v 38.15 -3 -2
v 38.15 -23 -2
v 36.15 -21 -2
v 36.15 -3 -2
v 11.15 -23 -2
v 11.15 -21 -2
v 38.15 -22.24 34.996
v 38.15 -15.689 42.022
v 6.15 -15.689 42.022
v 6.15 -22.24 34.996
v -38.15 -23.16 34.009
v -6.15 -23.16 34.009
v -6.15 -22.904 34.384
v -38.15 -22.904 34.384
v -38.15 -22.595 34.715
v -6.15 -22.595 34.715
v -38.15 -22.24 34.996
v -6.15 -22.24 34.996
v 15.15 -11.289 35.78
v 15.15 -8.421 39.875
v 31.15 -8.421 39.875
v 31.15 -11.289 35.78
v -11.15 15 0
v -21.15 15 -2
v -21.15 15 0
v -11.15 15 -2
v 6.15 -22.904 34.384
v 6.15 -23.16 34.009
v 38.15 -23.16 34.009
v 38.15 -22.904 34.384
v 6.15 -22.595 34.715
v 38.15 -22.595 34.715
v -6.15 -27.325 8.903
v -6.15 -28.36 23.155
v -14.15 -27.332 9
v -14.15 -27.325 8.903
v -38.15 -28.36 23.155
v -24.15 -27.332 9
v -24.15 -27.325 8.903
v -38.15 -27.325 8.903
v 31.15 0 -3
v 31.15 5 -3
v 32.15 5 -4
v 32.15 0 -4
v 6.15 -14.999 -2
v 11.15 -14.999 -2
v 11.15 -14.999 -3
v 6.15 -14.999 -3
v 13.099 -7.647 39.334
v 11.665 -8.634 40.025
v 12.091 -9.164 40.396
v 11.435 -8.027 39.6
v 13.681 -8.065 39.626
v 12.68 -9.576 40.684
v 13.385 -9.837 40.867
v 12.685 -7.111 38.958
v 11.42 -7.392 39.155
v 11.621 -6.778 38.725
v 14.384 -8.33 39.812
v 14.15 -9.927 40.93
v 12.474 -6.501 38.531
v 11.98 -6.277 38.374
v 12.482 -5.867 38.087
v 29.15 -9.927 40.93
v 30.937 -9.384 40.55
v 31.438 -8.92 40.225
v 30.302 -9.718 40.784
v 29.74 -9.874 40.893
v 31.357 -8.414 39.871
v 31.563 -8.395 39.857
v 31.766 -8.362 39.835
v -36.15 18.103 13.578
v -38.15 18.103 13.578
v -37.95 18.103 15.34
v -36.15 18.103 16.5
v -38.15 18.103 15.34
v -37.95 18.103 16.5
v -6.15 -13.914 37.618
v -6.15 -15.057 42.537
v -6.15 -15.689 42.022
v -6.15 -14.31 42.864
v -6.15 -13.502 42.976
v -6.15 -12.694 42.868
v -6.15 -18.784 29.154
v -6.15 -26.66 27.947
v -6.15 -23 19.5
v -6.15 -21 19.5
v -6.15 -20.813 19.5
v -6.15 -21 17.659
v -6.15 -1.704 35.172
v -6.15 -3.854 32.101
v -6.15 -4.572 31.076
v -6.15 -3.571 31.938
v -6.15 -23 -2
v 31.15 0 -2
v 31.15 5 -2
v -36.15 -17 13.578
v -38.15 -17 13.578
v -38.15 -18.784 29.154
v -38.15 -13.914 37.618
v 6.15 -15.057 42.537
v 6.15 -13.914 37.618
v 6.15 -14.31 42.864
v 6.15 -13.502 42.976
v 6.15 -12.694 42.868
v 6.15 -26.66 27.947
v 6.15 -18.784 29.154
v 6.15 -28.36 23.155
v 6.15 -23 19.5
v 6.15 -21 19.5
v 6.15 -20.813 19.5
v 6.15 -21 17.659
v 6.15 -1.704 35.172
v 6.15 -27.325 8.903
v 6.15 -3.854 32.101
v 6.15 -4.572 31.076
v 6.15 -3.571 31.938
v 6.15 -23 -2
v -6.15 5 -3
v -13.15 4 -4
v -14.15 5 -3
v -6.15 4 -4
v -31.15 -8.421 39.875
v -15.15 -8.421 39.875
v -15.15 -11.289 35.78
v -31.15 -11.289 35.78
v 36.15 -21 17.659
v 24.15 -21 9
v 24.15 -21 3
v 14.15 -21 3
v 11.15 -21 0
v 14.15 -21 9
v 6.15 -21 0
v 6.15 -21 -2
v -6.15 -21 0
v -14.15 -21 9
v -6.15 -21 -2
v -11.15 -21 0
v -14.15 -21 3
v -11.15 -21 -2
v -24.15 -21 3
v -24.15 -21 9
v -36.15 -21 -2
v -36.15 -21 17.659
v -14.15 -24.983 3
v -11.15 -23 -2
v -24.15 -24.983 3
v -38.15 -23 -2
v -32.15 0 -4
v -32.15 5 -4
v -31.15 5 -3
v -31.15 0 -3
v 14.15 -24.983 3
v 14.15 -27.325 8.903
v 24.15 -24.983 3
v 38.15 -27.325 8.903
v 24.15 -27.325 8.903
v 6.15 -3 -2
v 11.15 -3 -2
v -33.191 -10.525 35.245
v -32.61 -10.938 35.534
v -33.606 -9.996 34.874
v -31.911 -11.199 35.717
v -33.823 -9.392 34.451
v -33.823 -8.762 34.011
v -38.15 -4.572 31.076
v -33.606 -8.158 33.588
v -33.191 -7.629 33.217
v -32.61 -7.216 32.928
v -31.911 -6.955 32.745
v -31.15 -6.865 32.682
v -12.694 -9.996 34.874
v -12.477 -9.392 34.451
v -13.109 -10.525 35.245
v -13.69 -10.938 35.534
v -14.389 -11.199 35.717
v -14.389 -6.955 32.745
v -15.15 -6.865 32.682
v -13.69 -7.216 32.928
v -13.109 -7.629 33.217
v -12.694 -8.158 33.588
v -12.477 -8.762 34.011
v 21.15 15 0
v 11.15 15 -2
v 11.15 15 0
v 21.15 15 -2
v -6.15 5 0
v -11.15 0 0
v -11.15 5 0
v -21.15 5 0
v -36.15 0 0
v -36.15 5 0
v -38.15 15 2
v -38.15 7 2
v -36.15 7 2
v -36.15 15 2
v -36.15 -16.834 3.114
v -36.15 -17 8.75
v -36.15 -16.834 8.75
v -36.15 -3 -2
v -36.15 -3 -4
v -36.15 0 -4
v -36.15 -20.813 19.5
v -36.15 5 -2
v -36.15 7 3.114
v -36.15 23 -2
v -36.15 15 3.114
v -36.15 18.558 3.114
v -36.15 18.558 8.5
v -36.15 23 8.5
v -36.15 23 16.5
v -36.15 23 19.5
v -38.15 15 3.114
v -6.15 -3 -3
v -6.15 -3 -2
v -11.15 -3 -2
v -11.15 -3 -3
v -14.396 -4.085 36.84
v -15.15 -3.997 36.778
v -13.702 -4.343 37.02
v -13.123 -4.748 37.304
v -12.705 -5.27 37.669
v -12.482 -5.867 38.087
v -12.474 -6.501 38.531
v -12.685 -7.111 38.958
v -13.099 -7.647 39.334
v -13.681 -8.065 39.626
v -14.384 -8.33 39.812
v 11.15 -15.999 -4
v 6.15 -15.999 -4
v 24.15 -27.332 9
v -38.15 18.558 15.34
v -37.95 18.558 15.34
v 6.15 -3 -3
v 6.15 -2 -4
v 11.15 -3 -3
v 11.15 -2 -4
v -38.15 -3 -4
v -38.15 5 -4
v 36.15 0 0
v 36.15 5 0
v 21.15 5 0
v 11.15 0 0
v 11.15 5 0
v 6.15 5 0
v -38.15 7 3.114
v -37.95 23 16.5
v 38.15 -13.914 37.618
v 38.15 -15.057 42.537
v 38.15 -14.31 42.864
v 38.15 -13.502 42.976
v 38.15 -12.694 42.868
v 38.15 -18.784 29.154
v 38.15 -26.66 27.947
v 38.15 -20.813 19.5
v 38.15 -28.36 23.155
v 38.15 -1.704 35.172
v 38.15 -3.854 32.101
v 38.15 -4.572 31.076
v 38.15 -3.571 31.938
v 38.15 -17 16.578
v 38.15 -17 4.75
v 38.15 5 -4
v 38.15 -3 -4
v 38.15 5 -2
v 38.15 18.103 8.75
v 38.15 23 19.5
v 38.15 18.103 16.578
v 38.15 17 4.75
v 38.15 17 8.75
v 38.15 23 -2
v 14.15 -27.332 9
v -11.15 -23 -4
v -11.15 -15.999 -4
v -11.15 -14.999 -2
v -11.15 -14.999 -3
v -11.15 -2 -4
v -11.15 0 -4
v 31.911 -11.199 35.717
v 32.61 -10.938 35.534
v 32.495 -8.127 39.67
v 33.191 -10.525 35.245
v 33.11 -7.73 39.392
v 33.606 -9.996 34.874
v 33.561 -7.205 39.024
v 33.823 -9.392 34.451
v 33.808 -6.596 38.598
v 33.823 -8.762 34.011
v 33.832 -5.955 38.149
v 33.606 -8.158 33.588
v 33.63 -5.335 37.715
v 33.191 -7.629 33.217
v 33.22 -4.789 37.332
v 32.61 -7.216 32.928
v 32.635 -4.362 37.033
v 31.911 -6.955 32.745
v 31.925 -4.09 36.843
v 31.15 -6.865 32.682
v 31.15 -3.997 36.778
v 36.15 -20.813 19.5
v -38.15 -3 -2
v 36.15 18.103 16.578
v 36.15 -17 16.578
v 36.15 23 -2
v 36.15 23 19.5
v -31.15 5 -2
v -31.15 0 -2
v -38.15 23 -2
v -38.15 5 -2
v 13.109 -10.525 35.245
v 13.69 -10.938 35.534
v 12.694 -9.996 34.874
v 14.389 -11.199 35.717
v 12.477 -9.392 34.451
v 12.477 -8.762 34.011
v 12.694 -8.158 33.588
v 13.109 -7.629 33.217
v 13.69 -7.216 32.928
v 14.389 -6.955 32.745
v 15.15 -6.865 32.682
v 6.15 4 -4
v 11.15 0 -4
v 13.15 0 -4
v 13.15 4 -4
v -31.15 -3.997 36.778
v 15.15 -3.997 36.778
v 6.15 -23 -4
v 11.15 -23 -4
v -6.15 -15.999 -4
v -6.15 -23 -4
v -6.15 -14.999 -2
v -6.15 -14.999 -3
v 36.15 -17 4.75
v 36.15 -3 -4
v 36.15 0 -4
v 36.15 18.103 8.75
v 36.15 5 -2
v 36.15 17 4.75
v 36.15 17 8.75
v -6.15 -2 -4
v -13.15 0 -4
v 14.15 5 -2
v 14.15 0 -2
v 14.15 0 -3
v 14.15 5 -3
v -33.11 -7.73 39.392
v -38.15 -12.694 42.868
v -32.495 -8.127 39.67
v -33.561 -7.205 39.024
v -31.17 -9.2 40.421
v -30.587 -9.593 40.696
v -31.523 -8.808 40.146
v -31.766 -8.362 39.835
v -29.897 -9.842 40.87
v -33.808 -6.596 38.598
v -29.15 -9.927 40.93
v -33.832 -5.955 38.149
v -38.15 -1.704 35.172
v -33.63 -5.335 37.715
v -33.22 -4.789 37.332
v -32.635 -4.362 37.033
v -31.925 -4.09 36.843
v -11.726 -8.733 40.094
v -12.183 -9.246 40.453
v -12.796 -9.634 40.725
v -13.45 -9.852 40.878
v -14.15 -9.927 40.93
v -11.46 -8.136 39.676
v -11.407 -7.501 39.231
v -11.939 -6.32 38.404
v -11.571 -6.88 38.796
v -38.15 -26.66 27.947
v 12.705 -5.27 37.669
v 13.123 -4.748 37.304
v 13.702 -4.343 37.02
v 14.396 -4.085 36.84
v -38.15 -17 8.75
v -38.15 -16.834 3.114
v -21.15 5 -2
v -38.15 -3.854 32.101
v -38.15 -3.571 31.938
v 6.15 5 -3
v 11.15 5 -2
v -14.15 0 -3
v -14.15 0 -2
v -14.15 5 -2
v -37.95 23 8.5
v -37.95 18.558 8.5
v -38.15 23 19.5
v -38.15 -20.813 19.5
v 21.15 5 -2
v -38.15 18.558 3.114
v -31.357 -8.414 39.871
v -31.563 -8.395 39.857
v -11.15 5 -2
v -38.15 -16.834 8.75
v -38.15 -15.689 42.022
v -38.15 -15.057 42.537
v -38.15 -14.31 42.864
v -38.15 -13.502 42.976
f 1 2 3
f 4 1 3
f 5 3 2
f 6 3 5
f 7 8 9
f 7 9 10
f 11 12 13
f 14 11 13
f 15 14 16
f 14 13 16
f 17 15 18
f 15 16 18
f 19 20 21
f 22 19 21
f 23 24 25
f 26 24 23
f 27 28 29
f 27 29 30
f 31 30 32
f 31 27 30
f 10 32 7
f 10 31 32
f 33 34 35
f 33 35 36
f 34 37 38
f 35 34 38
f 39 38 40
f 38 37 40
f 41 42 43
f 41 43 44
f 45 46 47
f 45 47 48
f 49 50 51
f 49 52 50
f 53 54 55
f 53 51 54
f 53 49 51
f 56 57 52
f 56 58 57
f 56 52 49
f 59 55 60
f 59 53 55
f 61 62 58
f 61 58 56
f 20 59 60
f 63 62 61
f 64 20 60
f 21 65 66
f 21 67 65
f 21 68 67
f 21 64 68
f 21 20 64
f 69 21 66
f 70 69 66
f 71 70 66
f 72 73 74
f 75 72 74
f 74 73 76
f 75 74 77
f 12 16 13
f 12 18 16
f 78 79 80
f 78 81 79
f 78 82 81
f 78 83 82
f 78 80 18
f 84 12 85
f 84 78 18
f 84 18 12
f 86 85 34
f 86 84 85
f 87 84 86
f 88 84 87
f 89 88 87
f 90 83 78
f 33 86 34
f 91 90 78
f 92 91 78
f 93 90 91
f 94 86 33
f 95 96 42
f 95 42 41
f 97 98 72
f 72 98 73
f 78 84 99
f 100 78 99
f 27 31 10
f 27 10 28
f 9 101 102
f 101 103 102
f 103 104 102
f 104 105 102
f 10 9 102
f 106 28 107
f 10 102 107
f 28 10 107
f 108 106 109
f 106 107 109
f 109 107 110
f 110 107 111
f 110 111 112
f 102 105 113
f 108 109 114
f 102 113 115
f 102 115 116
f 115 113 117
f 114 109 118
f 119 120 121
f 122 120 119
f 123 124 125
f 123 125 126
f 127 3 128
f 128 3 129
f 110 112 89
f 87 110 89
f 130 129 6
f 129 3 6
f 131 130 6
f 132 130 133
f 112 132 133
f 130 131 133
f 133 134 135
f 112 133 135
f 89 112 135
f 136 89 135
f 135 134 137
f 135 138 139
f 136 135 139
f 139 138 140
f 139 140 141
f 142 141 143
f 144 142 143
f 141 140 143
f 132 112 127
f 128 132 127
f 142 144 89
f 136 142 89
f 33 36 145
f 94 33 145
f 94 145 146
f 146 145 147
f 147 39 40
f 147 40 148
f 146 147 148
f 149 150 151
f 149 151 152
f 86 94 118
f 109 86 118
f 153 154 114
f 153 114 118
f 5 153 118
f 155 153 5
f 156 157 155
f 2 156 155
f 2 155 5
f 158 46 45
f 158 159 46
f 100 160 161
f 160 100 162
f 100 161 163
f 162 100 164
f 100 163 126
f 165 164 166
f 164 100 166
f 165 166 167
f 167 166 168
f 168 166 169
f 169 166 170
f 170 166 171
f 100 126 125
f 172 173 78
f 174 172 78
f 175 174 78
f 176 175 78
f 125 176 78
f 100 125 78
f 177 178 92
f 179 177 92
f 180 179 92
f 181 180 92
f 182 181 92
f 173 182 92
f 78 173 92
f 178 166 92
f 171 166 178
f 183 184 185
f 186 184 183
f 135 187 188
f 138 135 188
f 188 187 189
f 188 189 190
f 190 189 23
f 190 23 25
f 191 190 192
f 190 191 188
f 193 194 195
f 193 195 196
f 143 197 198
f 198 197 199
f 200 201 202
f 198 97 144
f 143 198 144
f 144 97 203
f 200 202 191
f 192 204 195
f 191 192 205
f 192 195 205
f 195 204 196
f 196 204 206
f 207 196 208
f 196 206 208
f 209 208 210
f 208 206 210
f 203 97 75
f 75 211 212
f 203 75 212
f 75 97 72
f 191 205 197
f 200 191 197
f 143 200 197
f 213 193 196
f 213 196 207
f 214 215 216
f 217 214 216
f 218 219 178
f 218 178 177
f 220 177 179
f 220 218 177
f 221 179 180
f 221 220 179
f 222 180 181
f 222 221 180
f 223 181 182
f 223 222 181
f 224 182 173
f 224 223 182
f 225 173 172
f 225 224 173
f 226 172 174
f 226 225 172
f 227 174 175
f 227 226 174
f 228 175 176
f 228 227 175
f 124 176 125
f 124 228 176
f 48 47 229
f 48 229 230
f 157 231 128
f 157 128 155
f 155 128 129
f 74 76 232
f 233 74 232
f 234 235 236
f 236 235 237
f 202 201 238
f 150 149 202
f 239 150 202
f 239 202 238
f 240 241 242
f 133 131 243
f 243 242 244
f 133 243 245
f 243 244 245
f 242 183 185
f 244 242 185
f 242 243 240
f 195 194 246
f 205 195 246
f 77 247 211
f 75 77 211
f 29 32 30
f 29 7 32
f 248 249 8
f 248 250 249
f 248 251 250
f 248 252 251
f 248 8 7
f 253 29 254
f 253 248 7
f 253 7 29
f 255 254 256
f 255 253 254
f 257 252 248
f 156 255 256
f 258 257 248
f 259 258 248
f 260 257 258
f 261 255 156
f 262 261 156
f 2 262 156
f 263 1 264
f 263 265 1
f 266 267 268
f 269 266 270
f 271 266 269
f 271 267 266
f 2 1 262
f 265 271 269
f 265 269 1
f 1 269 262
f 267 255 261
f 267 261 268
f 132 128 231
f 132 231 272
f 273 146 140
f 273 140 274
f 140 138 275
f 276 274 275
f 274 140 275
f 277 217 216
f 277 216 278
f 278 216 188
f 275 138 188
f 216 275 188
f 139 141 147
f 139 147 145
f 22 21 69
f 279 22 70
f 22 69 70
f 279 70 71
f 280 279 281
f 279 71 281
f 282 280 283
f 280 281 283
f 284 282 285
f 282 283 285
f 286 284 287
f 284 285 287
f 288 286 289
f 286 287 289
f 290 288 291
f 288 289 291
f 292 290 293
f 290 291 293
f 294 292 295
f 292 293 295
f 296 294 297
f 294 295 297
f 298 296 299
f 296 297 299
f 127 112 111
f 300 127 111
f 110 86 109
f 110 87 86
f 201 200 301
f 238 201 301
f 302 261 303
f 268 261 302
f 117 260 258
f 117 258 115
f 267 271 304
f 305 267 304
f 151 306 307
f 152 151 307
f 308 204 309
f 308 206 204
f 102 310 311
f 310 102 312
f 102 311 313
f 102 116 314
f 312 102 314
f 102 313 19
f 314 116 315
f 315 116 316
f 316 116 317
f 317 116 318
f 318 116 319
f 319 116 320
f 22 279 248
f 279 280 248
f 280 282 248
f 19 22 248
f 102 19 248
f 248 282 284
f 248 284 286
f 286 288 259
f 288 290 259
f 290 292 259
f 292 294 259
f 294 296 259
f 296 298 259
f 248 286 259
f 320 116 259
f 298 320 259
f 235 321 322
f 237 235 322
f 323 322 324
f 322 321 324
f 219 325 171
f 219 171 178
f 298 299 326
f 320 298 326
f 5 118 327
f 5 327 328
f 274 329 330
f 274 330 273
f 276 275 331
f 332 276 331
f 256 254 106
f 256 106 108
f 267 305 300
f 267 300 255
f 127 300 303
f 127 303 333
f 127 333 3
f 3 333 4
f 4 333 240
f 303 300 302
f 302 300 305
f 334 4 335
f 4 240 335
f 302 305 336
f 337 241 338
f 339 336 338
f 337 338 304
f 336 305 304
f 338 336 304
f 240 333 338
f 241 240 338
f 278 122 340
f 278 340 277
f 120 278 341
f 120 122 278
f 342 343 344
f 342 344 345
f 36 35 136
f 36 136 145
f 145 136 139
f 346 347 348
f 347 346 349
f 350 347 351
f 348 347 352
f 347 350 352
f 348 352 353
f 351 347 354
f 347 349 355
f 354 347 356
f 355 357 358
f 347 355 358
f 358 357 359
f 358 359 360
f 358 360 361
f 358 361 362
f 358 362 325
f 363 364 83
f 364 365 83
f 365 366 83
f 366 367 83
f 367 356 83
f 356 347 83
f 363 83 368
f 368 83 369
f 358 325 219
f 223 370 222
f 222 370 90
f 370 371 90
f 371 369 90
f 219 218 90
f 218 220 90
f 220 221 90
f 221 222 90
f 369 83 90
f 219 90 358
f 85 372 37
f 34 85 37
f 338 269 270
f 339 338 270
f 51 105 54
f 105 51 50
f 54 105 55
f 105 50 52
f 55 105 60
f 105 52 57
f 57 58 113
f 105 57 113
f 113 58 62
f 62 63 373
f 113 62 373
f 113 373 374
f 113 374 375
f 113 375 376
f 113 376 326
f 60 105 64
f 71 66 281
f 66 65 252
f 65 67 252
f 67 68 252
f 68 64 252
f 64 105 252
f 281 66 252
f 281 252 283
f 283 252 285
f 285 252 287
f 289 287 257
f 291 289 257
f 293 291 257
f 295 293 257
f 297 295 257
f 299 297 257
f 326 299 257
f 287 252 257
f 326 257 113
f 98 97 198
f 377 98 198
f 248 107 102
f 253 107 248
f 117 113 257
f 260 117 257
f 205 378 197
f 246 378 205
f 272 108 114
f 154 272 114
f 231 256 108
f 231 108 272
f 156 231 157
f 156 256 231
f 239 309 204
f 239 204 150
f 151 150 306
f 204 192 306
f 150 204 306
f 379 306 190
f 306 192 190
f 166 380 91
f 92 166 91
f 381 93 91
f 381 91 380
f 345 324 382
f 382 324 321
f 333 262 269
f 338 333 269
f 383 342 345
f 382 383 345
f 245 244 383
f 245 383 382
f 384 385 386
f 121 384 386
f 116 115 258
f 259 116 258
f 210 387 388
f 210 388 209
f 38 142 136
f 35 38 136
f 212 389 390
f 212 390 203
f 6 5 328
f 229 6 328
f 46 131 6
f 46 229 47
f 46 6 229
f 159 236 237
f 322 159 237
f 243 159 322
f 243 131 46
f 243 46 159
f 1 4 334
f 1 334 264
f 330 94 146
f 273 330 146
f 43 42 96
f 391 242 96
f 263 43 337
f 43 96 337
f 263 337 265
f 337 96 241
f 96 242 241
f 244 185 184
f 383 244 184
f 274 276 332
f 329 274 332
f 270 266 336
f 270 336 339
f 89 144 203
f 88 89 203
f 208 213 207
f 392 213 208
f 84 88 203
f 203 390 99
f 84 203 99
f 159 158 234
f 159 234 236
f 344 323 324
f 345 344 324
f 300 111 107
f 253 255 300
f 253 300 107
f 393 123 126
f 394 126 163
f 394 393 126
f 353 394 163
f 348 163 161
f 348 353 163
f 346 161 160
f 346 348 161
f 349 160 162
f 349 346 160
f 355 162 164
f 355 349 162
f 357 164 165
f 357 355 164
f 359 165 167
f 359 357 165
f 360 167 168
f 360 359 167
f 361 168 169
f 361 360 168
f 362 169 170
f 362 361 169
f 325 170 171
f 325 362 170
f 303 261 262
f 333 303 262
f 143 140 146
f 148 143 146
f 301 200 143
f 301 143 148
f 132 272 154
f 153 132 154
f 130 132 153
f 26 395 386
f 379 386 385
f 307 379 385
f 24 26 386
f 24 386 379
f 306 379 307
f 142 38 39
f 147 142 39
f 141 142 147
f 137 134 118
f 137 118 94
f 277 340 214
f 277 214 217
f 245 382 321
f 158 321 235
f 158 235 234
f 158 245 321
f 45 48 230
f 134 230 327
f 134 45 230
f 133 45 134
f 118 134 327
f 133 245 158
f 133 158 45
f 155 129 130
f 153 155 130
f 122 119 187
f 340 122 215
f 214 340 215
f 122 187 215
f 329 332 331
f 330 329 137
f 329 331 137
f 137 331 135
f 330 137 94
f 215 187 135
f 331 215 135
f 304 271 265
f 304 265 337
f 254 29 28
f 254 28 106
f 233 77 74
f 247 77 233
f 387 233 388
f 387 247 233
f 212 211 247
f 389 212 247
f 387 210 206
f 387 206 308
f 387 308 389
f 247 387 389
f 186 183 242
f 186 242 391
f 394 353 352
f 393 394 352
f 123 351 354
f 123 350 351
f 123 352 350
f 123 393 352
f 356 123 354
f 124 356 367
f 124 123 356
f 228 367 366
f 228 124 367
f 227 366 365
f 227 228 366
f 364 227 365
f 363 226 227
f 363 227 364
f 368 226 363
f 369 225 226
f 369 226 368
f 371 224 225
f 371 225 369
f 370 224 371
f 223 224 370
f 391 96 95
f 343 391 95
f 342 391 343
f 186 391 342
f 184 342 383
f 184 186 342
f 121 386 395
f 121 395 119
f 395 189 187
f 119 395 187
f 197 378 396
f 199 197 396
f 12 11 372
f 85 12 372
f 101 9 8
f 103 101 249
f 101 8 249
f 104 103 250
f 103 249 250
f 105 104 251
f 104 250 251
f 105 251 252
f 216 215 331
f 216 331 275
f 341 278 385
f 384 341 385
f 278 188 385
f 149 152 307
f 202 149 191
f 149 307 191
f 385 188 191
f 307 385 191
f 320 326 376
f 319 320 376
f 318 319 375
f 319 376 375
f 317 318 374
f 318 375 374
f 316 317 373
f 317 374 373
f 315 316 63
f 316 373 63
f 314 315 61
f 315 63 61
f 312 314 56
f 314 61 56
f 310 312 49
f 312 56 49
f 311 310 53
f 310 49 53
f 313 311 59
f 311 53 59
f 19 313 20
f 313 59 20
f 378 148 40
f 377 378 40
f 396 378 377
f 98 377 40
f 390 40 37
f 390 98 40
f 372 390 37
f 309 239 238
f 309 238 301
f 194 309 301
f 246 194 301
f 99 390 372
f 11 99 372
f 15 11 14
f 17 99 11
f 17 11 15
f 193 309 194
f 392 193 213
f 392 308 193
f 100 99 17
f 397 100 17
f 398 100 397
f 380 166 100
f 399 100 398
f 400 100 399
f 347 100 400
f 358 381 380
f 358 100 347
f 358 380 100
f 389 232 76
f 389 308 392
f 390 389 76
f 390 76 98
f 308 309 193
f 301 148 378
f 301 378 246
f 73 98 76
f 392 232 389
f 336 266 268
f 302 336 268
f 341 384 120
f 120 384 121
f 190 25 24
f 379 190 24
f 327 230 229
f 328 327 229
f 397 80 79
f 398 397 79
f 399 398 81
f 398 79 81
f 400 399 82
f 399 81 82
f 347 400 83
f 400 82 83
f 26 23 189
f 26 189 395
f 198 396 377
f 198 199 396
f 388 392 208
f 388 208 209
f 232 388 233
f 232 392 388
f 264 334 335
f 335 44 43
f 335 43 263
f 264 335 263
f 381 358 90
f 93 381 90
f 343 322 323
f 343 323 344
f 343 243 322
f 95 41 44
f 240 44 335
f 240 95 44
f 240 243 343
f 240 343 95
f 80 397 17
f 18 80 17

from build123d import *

# Parameters (mm, degrees)
EXTRUDE_2_DEPTH      = 10
SKETCH_6_W           = 2
SKETCH_6_H           = 18
EXTRUDE_3_DEPTH      = 2
EXTRUDE_4_DEPTH      = 9.5
SKETCH_8_W           = 7
SKETCH_8_H           = 28
CUT_EXTRUDE_3_DEPTH  = 25.5
SKETCH_9_W           = 7.5
SKETCH_9_H           = 8
CUT_EXTRUDE_4_DEPTH  = 25.5
SKETCH_10_W          = 1.5
SKETCH_10_H          = 3
CUT_EXTRUDE_5_DEPTH  = 32
EXTRUDE_5_DEPTH      = 32
FILLET_1_R           = 3
FILLET_2_R           = 3
SKETCH_15_W          = 10
SKETCH_15_H          = 2
EXTRUDE_6_DEPTH      = 10
CUT_EXTRUDE_7_DEPTH  = 10
SKETCH_17_W          = 5
SKETCH_17_H          = 6
CUT_EXTRUDE_8_DEPTH  = 10
SKETCH_18_W          = 1.50410549
SKETCH_18_H          = 3
CUT_EXTRUDE_9_DEPTH  = 32
SKETCH_19_W          = 5
SKETCH_19_H          = 6
CUT_EXTRUDE_10_DEPTH = 10
CUT_EXTRUDE_11_DEPTH = 10
SKETCH_22_W          = 1.8
SKETCH_22_H          = 8
CUT_EXTRUDE_12_DEPTH = 34
CUT_EXTRUDE_13_DEPTH = 34
EXTRUDE_7_DEPTH      = 2
CHAMFER_1_SIZE       = 1
EXTRUDE_START        = 10
SKETCH_25_W          = 32
SKETCH_25_H          = 15
EXTRUDE_8_DEPTH      = 10
EXTRUDE_9_DEPTH      = 32
CUT_EXTRUDE_15_DEPTH = 10
FILLET_3_R           = 3
SKETCH_28_W          = 12.226221142
SKETCH_28_H          = 35.391692779
CUT_EXTRUDE_16_DEPTH = 10
CUT_EXTRUDE_17_DEPTH = 95
CUT_EXTRUDE_18_DEPTH = 95
SKETCH_31_W          = 3
SKETCH_31_H          = 34
EXTRUDE_10_DEPTH     = 2
SKETCH_32_W          = 3
SKETCH_32_H          = 35.103131655
EXTRUDE_11_DEPTH     = 2
SKETCH_33_W          = 32
SKETCH_33_H          = 13.416826231
EXTRUDE_12_DEPTH     = 5
CUT_EXTRUDE_19_DEPTH = 5


with BuildPart() as part:
    # 草图5 → 凸台-拉伸2 (new body)
    with BuildSketch(Plane.XY):
        Polygon((-38.15, -23), (-38.15, 23), (-36.15, 23), (-36.15, -21), (36.15, -21), (36.15, 23), (38.15, 23), (38.15, -23), align=None)
    extrude(amount=EXTRUDE_2_DEPTH)

    # 草图6 → 凸台-拉伸3 (add)
    with BuildSketch(Plane(origin=(0, 0, 0), x_dir=(-1, 0, 0), z_dir=(0, 0, -1))):
        Polygon((-6.15, 5), (-36.15, 5), (-36.15, 0), (-11.15, 0), (-11.15, -21), (-6.15, -21), align=None)
        Polygon((-36.15, 0), (-36.15, 5), (-36.15, 23), (-38.15, 23), (-38.15, 5), (-38.15, 0), (-38.15, -23), (-11.15, -23), (-6.15, -23), (6.15, -23), (11.15, -23), (38.15, -23), (38.15, 0), (38.15, 5), (36.15, 5), (36.15, 0), (36.15, -21), (11.15, -21), (6.15, -21), (-6.15, -21), (-11.15, -21), (-36.15, -21), align=None)
        Polygon((6.15, 0), (6.15, -21), (11.15, -21), (11.15, 0), (36.15, 0), (36.15, 5), (6.15, 5), align=None)
        with Locations((37.15, 14)):
            Rectangle(SKETCH_6_W, SKETCH_6_H)
    extrude(amount=EXTRUDE_3_DEPTH)

    # 草图7 → 凸台-拉伸4 (add)
    with BuildSketch(Plane.XY.offset(10)):
        Polygon((36.15, 23), (36.15, -21), (-36.15, -21), (-36.15, 23), (-38.15, 23), (-38.15, -23), (38.15, -23), (38.15, 23), align=None)
    extrude(amount=EXTRUDE_4_DEPTH)

    # 草图8 → 切除-拉伸3 (cut)
    with BuildSketch(Plane(origin=(38.15, 0, 0), x_dir=(0, 0, -1), z_dir=(1, 0, 0))):
        with Locations((-5.25, 0)):
            Rectangle(SKETCH_8_W, SKETCH_8_H)
    extrude(amount=-CUT_EXTRUDE_3_DEPTH, mode=Mode.SUBTRACT)

    # 草图9 → 切除-拉伸4 (cut)
    with BuildSketch(Plane.ZY.offset(38.15)):
        with Locations((5.75, 11)):
            Rectangle(SKETCH_9_W, SKETCH_9_H)
    extrude(amount=-CUT_EXTRUDE_4_DEPTH, mode=Mode.SUBTRACT)

    # 草图10 → 切除-拉伸5 (cut)
    with BuildSketch(Plane(origin=(0, 23, 0), x_dir=(1, 0, 0), z_dir=(0, 1, 0))):
        with Locations((-36.9, -12)):
            Rectangle(SKETCH_10_W, SKETCH_10_H)
    extrude(amount=-CUT_EXTRUDE_5_DEPTH, mode=Mode.SUBTRACT)

    # 草图11 → 凸台-拉伸5 (add)
    with BuildSketch(Plane(origin=(38.15, 0, 0), x_dir=(0, 0, -1), z_dir=(1, 0, 0))):
        Polygon((-27.947222626, -26.659598219), (-23.155372135, -28.359869707), (-8.903497586, -27.324579693), (2, -23), (-19.5, -20.812742031), (-29.153549837, -18.784030413), (-23.27364124, -8.564706774), (-27.607476664, -6.071140951), (-36.607476664, -21.659598219), align=None)
    extrude_5 = extrude(amount=-EXTRUDE_5_DEPTH)

    # 镜向1: 凸台-拉伸5 across plane
    add(extrude_5.mirror(Plane(origin=(0, 0, 0), x_dir=(0, 0, 1), z_dir=(1, 0, 0))))

    # 圆角1
    fillet_1_edges = [part.edges().sort_by_distance(p)[0] for p in [
        (-22.15, -21.659598219, 36.607476664),
    ]]
    fillet(fillet_1_edges, radius=FILLET_1_R)

    # 圆角2
    fillet_2_edges = [part.edges().sort_by_distance(p)[0] for p in [
        (22.15, -21.659598219, 36.607476664),
    ]]
    fillet(fillet_2_edges, radius=FILLET_2_R)

    # 草图15 → 凸台-拉伸6 (add)
    with BuildSketch(Plane(origin=(0, 5, 0), x_dir=(1, 0, 0), z_dir=(0, 1, 0))):
        with Locations((-16.15, 1)):
            Rectangle(SKETCH_15_W, SKETCH_15_H)
        with Locations((16.15, 1)):
            Rectangle(SKETCH_15_W, SKETCH_15_H)
    extrude(amount=EXTRUDE_6_DEPTH)

    # 草图16 → 切除-拉伸7 (cut)
    with BuildSketch(Plane(origin=(38.15, 0, 0), x_dir=(0, 0, -1), z_dir=(1, 0, 0))):
        Polygon((-9.75, 5), (-8.75, 5), (-8.75, 14), (-1.75, 14), (-1.75, 17), (-9.75, 17), align=None)
    extrude(amount=-CUT_EXTRUDE_7_DEPTH, mode=Mode.SUBTRACT)

    # 草图17 → 切除-拉伸8 (cut)
    with BuildSketch(Plane(origin=(0, -21, 0), x_dir=(1, 0, 0), z_dir=(0, 1, 0))):
        with Locations((-21.65, -6)):
            Rectangle(SKETCH_17_W, SKETCH_17_H)
    cut_extrude_8 = extrude(amount=-CUT_EXTRUDE_8_DEPTH, mode=Mode.SUBTRACT)

    # 镜向3: 切除-拉伸8 across plane
    add(cut_extrude_8.mirror(Plane(origin=(0, 0, 0), x_dir=(0, 0, 1), z_dir=(1, 0, 0))), mode=Mode.SUBTRACT)

    # 草图18 → 切除-拉伸9 (cut)
    with BuildSketch(Plane(origin=(0, 23, 0), x_dir=(1, 0, 0), z_dir=(0, 1, 0))):
        with Locations((-36.902052745, -15)):
            Rectangle(SKETCH_18_W, SKETCH_18_H)
    extrude(amount=-CUT_EXTRUDE_9_DEPTH, mode=Mode.SUBTRACT)

    # 草图19 → 切除-拉伸10 (cut)
    with BuildSketch(Plane(origin=(0, -21, 0), x_dir=(1, 0, 0), z_dir=(0, 1, 0))):
        with Locations((-16.65, -6)):
            Rectangle(SKETCH_19_W, SKETCH_19_H)
    cut_extrude_10 = extrude(amount=-CUT_EXTRUDE_10_DEPTH, mode=Mode.SUBTRACT)

    # 镜向4: 切除-拉伸10 across plane
    add(cut_extrude_10.mirror(Plane(origin=(0, 0, 0), x_dir=(0, 0, 1), z_dir=(1, 0, 0))), mode=Mode.SUBTRACT)

    # 草图21 → 切除-拉伸11 (cut)
    with BuildSketch(Plane(origin=(0, 10.436602825, 18.076726351), x_dir=(1, 0, 0), z_dir=(0, 0.5000000000000001, 0.8660254037844386))):
        with BuildLine():
            Line((-29.15, -23.561500625), (-14.15, -23.561500625))
            ThreePointArc((-14.15, -23.561500625), (-11.4, -26.311500625), (-14.15, -29.061500625))
            Line((-14.15, -29.061500625), (-29.15, -29.061500625))
            ThreePointArc((-29.15, -29.061500625), (-31.9, -26.311500625), (-29.15, -23.561500625))
        make_face()
        with BuildLine():
            Line((14.15, -23.561500625), (29.15, -23.561500625))
            ThreePointArc((29.15, -23.561500625), (31.9, -26.311500625), (29.15, -29.061500625))
            Line((29.15, -29.061500625), (14.15, -29.061500625))
            ThreePointArc((14.15, -29.061500625), (11.4, -26.311500625), (14.15, -23.561500625))
        make_face()
    extrude(amount=-CUT_EXTRUDE_11_DEPTH, mode=Mode.SUBTRACT)

    # 草图22 → 切除-拉伸12 (cut)
    with BuildSketch(Plane(origin=(0, 23, 0), x_dir=(1, 0, 0), z_dir=(0, 1, 0))):
        with Locations((-37.05, -12.5)):
            Rectangle(SKETCH_22_W, SKETCH_22_H)
    extrude(amount=-CUT_EXTRUDE_12_DEPTH, mode=Mode.SUBTRACT)

    # 草图23 → 切除-拉伸13 (cut)
    with BuildSketch(Plane(origin=(38.15, 0, 0), x_dir=(0, 0, -1), z_dir=(1, 0, 0))):
        Polygon((-8.75, -14), (-8.75, 1), (-14.75, 1), (-14.75, -14), (-14.75, -17), (-1.75, -17), (-1.75, -14), align=None)
    extrude(amount=-CUT_EXTRUDE_13_DEPTH, mode=Mode.SUBTRACT)

    # 草图24 → 凸台-拉伸7 (add)
    with BuildSketch(Plane(origin=(0, 0, -2), x_dir=(-1, 0, 0), z_dir=(0, 0, -1))):
        Polygon((6.15, 5), (6.15, -3), (11.15, -3), (11.15, 0), (14.15, 0), (14.15, 5), (11.15, 5), align=None)
        Polygon((6.15, -21), (6.15, -23), (11.15, -23), (11.15, -21), (11.15, -14.999314237), (6.15, -14.999314237), align=None)
        Polygon((36.15, -3), (38.15, -3), (38.15, 5), (36.15, 5), (31.15, 5), (31.15, 0), (36.15, 0), align=None)
    extrude_7 = extrude(amount=EXTRUDE_7_DEPTH)

    # 镜向5: 凸台-拉伸7 across plane
    add(extrude_7.mirror(Plane(origin=(0, 0, 0), x_dir=(0, 0, 1), z_dir=(1, 0, 0))))

    # 倒角1
    chamfer_1_edges = [part.edges().sort_by_distance(p)[0] for p in [
        (-8.65, -14.999314237, -4),
        (8.65, -14.999314237, -4),
        (-31.15, 2.5, -4),
        (31.15, 2.5, -4),
        (-14.15, 2.5, -4),
        (-10.15, 5, -4),
        (-8.65, -3, -4),
        (8.65, -3, -4),
        (10.15, 5, -4),
        (14.15, 2.5, -4),
    ]]
    chamfer(chamfer_1_edges, length=CHAMFER_1_SIZE)

    # 草图25 → 凸台-拉伸8 (add)
    # profile 1 of 2: a face of its own
    with BuildSketch(Plane(origin=(0, 10.436602825, 18.076726351), x_dir=(1, 0, 0), z_dir=(0, 0.5000000000000001, 0.8660254037844386)).offset(EXTRUDE_START)):
        with Locations((22.15, -26.561500625)):
            Rectangle(SKETCH_25_W, SKETCH_25_H)
        with BuildLine():
            Line((14.15, -23.561500625), (29.15, -23.561500625))
            ThreePointArc((29.15, -23.561500625), (31.9, -26.311500625), (29.15, -29.061500625))
            Line((29.15, -29.061500625), (14.15, -29.061500625))
            ThreePointArc((14.15, -29.061500625), (11.4, -26.311500625), (14.15, -23.561500625))
        make_face(mode=Mode.SUBTRACT)
    # profile 2 of 2: a face of its own
    with BuildSketch(Plane(origin=(0, 10.436602825, 18.076726351), x_dir=(1, 0, 0), z_dir=(0, 0.5000000000000001, 0.8660254037844386)).offset(EXTRUDE_START)):
        with Locations((-22.15, -26.561500625)):
            Rectangle(SKETCH_25_W, SKETCH_25_H)
        with BuildLine():
            Line((-14.15, -29.061500625), (-29.15, -29.061500625))
            ThreePointArc((-29.15, -29.061500625), (-31.9, -26.311500625), (-29.15, -23.561500625))
            Line((-29.15, -23.561500625), (-14.15, -23.561500625))
            ThreePointArc((-14.15, -23.561500625), (-11.4, -26.311500625), (-14.15, -29.061500625))
        make_face(mode=Mode.SUBTRACT)
    extrude(amount=-EXTRUDE_8_DEPTH)

    # 草图26 → 凸台-拉伸9 (add)
    with BuildSketch(Plane(origin=(38.15, 0, 0), x_dir=(0, 0, -1), z_dir=(1, 0, 0))):
        with BuildLine():
            Line((-43.767730702, -14.061522007), (-34.996197894, -22.23956804))
            ThreePointArc((-34.996197894, -22.23956804), (-35.507563084, -20.66650219), (-35.107476664, -19.061522007))
            Line((-35.107476664, -19.061522007), (-43.767730702, -14.061522007))
        make_face()
    extrude_9 = extrude(amount=-EXTRUDE_9_DEPTH)

    # 镜向7: 凸台-拉伸9 across plane
    add(extrude_9.mirror(Plane(origin=(0, 0, 0), x_dir=(0, 0, 1), z_dir=(1, 0, 0))))

    # 草图27 → 切除-拉伸15 (cut)
    with BuildSketch(Plane(origin=(0, 7.930284472, 13.782891728), x_dir=(-1, 0, 0), z_dir=(0, -0.4987131647423246, -0.86676708481154))):
        Polygon((-6.15, -30.820638385), (6.15, -30.820638385), (38.15, -30.820638385), (42.174164157, -30.820638385), (42.174164157, -16.561104399), (-38.15, -16.561104399), (-38.15, -19.030477201), (-6.15, -19.030477201), align=None)
    cut_extrude_15 = extrude(amount=-CUT_EXTRUDE_15_DEPTH, mode=Mode.SUBTRACT)

    # 镜向8: 切除-拉伸15 across plane
    add(cut_extrude_15.mirror(Plane(origin=(0, 0, 0), x_dir=(0, 0, 1), z_dir=(1, 0, 0))), mode=Mode.SUBTRACT)

    # 圆角3
    fillet_3_edges = [part.edges().sort_by_distance(p)[0] for p in [
        (-22.15, -14.061522007, 43.767730702),
        (22.15, -14.061522007, 43.767730702),
    ]]
    fillet(fillet_3_edges, radius=FILLET_3_R)

    # 草图28 → 切除-拉伸16 (cut)
    with BuildSketch(Plane.ZY.offset(38.15)):
        with Locations((9.227199623, 0.86169181)):
            Rectangle(SKETCH_28_W, SKETCH_28_H)
    extrude(amount=-CUT_EXTRUDE_16_DEPTH, mode=Mode.SUBTRACT)

    # 草图29 → 切除-拉伸17 (cut)
    with BuildSketch(Plane(origin=(38.15, 0, 0), x_dir=(0, 0, -1), z_dir=(1, 0, 0))):
        with BuildLine():
            Line((-42.867599384, -12.694168141), (-35.172024007, -1.703747506))
            Line((-35.172024007, -1.703747506), (-36.267730702, -1.071140951))
            Line((-36.267730702, -1.071140951), (-42.574461771, -11.994719593))
            ThreePointArc((-42.574461771, -11.994719593), (-42.743221901, -12.335143524), (-42.867599384, -12.694168141))
        make_face()
    extrude(amount=-CUT_EXTRUDE_17_DEPTH, mode=Mode.SUBTRACT)

    # 草图30 → 切除-拉伸18 (cut)
    with BuildSketch(Plane(origin=(38.15, 0, 0), x_dir=(0, 0, -1), z_dir=(1, 0, 0))):
        Polygon((-14.75, -17), (-16.578106309, -17), (-16.578106309, 18.103131655), (-14.75, 18.103131655), (-8.75, 18.103131655), (-8.75, -17), align=None)
    extrude(amount=-CUT_EXTRUDE_18_DEPTH, mode=Mode.SUBTRACT)

    # 草图31 → 凸台-拉伸10 (add)
    with BuildSketch(Plane(origin=(38.15, 0, 0), x_dir=(0, 0, -1), z_dir=(1, 0, 0))):
        with Locations((-3.25, 0)):
            Rectangle(SKETCH_31_W, SKETCH_31_H)
    extrude(amount=-EXTRUDE_10_DEPTH)

    # 草图32 → 凸台-拉伸11 (add)
    with BuildSketch(Plane.ZY.offset(38.15)):
        with Locations((15.078106309, 0.551565828)):
            Rectangle(SKETCH_32_W, SKETCH_32_H)
    extrude(amount=-EXTRUDE_11_DEPTH)

    # 草图33 → 凸台-拉伸12 (add)
    with BuildSketch(Plane(origin=(0, 15.964929939, 22.80028287), x_dir=(1, 0, 0), z_dir=(0, 0.5735764363510407, 0.8191520442889957))):
        with Locations((22.15, -28.277885557)):
            Rectangle(SKETCH_33_W, SKETCH_33_H)
        with Locations((-22.15, -28.277885557)):
            Rectangle(SKETCH_33_W, SKETCH_33_H)
    extrude(amount=-EXTRUDE_12_DEPTH)

    # 草图34 → 切除-拉伸19 (cut)
    with BuildSketch(Plane(origin=(0, 15.964929939, 22.80028287), x_dir=(1, 0, 0), z_dir=(0, 0.5735764363510407, 0.8191520442889957))):
        with BuildLine():
            Line((-31.15, -24.369472442), (-15.15, -24.369472442))
            ThreePointArc((-15.15, -24.369472442), (-12.45, -27.069472442), (-15.15, -29.769472442))
            Line((-15.15, -29.769472442), (-31.15, -29.769472442))
            ThreePointArc((-31.15, -29.769472442), (-33.85, -27.069472442), (-31.15, -24.369472442))
        make_face()
    cut_extrude_19 = extrude(amount=-CUT_EXTRUDE_19_DEPTH, mode=Mode.SUBTRACT)

    # 镜向9: 切除-拉伸19 across plane
    add(cut_extrude_19.mirror(Plane(origin=(0, 0, 0), x_dir=(0, 0, 1), z_dir=(1, 0, 0))), mode=Mode.SUBTRACT)


solid = part.part
